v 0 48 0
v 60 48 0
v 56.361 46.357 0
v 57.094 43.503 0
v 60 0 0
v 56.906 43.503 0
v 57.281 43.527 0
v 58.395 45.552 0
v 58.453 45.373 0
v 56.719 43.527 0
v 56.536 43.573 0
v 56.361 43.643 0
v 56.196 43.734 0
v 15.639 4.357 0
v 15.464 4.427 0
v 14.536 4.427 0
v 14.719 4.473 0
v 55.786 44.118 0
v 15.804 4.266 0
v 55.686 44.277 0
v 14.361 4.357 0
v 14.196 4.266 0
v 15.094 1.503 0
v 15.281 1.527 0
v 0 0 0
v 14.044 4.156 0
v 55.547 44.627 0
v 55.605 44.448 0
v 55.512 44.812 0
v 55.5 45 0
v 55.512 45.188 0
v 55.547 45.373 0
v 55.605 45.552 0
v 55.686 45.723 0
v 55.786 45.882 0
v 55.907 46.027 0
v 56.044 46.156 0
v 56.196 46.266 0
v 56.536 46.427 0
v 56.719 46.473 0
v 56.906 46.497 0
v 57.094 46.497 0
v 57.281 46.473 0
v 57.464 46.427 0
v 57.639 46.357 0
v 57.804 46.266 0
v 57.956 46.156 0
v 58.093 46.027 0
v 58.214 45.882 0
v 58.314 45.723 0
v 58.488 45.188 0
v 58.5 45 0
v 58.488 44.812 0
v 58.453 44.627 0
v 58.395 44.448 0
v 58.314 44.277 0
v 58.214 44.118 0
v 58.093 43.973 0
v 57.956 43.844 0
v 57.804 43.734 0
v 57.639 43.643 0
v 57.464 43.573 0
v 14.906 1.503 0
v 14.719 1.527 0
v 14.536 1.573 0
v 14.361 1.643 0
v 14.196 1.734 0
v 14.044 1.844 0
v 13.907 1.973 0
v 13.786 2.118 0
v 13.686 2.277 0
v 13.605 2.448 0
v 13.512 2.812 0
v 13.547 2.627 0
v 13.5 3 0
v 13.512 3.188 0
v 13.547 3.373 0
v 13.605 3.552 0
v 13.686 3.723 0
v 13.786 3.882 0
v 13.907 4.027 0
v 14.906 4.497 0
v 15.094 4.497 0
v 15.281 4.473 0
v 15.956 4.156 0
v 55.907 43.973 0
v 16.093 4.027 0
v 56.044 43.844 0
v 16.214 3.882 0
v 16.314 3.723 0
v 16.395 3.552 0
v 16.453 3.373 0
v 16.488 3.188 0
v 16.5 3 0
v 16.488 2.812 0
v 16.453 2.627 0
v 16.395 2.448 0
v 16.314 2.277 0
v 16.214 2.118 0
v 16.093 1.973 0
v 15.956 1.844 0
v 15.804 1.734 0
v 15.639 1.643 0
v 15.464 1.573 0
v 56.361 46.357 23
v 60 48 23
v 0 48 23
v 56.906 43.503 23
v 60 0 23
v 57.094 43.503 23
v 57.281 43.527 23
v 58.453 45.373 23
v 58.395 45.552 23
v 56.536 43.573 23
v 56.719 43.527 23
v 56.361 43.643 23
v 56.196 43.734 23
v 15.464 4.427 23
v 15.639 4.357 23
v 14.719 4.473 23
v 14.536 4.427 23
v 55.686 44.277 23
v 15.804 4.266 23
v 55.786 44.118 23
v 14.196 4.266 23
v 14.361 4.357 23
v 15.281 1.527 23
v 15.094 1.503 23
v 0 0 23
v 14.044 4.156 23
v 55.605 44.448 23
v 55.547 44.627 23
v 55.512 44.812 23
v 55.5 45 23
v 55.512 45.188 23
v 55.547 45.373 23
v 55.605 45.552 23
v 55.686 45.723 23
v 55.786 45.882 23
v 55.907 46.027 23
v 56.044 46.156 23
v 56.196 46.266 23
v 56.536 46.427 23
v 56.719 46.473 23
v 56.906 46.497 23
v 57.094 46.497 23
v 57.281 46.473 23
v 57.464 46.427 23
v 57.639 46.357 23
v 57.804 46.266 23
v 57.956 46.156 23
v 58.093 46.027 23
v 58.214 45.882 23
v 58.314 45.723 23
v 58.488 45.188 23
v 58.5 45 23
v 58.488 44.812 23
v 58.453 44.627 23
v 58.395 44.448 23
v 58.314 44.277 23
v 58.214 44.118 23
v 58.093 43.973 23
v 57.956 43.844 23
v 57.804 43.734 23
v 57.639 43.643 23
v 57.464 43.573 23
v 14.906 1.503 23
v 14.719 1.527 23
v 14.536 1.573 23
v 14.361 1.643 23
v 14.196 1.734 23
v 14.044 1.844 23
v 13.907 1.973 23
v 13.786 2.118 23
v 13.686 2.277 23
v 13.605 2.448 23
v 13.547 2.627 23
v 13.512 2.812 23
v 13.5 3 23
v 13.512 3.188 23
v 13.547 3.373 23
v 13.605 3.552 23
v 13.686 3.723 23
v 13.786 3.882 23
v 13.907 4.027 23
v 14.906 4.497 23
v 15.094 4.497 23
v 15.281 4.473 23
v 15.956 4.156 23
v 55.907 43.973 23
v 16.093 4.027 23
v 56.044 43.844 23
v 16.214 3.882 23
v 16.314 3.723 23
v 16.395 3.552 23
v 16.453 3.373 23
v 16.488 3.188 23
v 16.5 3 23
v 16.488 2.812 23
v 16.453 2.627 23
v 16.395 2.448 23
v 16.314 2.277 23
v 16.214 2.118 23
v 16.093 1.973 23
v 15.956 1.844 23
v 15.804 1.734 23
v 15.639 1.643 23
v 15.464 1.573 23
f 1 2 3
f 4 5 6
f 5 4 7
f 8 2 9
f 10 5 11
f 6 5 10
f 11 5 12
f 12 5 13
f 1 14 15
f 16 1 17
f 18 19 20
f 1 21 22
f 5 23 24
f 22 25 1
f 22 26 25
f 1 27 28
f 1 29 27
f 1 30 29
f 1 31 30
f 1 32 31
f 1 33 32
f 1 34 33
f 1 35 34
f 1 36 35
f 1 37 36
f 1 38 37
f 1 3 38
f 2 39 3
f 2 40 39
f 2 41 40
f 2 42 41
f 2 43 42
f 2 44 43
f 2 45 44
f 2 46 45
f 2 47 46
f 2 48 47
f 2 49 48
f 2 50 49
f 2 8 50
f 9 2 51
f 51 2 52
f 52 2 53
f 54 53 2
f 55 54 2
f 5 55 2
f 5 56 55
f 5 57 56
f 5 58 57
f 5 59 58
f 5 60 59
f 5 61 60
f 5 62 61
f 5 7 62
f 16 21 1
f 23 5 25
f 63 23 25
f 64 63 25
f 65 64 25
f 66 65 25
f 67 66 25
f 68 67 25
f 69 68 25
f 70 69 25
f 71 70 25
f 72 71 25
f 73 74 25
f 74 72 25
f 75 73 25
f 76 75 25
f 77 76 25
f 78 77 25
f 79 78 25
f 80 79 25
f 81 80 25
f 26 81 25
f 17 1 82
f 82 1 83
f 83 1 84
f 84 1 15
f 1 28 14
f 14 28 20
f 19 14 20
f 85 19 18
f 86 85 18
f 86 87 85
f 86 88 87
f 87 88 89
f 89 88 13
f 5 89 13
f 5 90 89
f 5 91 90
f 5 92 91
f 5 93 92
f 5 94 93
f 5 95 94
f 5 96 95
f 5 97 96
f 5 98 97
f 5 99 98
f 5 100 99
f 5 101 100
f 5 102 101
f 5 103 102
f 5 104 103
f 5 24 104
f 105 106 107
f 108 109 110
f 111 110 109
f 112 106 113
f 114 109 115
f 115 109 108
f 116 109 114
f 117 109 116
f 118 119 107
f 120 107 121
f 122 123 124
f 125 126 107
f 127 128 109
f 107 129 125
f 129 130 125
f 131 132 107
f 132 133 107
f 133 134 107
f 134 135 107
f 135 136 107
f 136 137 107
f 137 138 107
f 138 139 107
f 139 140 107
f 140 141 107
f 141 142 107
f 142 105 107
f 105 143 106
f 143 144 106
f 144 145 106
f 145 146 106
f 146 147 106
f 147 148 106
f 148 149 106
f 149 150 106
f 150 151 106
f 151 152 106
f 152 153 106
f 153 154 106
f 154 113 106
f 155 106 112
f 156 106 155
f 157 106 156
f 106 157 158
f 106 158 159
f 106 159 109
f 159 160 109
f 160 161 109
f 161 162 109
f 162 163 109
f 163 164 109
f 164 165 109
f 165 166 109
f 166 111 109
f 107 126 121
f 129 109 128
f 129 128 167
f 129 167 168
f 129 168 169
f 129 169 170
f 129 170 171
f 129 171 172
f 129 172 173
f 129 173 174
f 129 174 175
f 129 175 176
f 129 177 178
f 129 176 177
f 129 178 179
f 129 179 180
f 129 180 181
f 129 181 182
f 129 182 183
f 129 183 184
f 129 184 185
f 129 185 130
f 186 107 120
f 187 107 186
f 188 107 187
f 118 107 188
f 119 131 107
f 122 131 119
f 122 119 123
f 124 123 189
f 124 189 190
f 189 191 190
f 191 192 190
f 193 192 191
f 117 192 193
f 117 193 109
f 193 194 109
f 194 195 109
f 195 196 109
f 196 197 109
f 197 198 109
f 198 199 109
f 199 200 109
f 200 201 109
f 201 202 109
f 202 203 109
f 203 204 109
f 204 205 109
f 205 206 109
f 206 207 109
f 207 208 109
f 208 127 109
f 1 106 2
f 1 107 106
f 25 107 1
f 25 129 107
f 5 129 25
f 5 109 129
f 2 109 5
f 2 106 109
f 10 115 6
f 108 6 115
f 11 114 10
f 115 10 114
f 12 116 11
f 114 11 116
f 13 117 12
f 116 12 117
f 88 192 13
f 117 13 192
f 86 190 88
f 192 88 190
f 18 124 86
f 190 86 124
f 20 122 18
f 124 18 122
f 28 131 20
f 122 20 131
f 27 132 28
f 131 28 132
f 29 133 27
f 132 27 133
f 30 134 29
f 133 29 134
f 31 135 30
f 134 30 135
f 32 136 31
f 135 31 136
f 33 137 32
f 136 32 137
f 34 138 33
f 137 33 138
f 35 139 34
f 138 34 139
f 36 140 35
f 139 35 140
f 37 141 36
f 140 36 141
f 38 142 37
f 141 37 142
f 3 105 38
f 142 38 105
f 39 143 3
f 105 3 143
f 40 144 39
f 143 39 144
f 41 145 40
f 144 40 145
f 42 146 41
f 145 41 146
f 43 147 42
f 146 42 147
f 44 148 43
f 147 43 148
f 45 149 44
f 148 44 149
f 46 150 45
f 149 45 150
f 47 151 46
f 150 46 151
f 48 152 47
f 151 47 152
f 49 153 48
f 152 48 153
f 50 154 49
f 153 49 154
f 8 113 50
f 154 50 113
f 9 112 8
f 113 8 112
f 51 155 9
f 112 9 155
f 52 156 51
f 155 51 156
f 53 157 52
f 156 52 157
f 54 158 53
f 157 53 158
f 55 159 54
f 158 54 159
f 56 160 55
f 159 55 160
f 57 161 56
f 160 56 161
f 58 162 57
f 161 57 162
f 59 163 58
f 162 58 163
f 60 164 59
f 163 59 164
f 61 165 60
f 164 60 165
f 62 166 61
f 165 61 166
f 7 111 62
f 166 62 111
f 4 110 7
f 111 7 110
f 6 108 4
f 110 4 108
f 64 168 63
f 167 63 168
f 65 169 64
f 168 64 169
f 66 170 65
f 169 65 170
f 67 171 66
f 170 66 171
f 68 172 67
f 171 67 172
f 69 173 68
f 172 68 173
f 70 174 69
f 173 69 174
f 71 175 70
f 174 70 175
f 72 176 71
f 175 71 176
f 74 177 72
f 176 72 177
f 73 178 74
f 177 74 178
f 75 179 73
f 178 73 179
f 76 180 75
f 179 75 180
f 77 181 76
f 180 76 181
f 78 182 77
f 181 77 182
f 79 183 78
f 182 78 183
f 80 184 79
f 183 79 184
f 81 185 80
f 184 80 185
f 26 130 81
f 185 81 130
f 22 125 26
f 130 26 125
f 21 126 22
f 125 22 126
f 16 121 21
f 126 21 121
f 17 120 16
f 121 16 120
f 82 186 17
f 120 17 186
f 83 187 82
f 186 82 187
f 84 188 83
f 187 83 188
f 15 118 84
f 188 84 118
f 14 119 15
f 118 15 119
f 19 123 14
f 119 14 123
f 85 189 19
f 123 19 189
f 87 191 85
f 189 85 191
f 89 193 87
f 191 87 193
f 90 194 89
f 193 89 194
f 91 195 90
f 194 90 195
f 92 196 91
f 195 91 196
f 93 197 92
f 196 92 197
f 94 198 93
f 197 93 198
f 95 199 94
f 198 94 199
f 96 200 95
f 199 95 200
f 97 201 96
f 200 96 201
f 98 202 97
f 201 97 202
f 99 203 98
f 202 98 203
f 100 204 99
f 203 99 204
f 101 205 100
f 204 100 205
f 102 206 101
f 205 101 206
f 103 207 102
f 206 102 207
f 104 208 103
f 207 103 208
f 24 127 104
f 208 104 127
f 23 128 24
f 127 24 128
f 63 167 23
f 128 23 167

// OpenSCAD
$fn=50;
module face() {
    difference() {
        square([60,48]);
        for(i=[[15,3],[57,45]])translate(i)circle(r=1.5);
    }
}

linear_extrude(height=23)face();
